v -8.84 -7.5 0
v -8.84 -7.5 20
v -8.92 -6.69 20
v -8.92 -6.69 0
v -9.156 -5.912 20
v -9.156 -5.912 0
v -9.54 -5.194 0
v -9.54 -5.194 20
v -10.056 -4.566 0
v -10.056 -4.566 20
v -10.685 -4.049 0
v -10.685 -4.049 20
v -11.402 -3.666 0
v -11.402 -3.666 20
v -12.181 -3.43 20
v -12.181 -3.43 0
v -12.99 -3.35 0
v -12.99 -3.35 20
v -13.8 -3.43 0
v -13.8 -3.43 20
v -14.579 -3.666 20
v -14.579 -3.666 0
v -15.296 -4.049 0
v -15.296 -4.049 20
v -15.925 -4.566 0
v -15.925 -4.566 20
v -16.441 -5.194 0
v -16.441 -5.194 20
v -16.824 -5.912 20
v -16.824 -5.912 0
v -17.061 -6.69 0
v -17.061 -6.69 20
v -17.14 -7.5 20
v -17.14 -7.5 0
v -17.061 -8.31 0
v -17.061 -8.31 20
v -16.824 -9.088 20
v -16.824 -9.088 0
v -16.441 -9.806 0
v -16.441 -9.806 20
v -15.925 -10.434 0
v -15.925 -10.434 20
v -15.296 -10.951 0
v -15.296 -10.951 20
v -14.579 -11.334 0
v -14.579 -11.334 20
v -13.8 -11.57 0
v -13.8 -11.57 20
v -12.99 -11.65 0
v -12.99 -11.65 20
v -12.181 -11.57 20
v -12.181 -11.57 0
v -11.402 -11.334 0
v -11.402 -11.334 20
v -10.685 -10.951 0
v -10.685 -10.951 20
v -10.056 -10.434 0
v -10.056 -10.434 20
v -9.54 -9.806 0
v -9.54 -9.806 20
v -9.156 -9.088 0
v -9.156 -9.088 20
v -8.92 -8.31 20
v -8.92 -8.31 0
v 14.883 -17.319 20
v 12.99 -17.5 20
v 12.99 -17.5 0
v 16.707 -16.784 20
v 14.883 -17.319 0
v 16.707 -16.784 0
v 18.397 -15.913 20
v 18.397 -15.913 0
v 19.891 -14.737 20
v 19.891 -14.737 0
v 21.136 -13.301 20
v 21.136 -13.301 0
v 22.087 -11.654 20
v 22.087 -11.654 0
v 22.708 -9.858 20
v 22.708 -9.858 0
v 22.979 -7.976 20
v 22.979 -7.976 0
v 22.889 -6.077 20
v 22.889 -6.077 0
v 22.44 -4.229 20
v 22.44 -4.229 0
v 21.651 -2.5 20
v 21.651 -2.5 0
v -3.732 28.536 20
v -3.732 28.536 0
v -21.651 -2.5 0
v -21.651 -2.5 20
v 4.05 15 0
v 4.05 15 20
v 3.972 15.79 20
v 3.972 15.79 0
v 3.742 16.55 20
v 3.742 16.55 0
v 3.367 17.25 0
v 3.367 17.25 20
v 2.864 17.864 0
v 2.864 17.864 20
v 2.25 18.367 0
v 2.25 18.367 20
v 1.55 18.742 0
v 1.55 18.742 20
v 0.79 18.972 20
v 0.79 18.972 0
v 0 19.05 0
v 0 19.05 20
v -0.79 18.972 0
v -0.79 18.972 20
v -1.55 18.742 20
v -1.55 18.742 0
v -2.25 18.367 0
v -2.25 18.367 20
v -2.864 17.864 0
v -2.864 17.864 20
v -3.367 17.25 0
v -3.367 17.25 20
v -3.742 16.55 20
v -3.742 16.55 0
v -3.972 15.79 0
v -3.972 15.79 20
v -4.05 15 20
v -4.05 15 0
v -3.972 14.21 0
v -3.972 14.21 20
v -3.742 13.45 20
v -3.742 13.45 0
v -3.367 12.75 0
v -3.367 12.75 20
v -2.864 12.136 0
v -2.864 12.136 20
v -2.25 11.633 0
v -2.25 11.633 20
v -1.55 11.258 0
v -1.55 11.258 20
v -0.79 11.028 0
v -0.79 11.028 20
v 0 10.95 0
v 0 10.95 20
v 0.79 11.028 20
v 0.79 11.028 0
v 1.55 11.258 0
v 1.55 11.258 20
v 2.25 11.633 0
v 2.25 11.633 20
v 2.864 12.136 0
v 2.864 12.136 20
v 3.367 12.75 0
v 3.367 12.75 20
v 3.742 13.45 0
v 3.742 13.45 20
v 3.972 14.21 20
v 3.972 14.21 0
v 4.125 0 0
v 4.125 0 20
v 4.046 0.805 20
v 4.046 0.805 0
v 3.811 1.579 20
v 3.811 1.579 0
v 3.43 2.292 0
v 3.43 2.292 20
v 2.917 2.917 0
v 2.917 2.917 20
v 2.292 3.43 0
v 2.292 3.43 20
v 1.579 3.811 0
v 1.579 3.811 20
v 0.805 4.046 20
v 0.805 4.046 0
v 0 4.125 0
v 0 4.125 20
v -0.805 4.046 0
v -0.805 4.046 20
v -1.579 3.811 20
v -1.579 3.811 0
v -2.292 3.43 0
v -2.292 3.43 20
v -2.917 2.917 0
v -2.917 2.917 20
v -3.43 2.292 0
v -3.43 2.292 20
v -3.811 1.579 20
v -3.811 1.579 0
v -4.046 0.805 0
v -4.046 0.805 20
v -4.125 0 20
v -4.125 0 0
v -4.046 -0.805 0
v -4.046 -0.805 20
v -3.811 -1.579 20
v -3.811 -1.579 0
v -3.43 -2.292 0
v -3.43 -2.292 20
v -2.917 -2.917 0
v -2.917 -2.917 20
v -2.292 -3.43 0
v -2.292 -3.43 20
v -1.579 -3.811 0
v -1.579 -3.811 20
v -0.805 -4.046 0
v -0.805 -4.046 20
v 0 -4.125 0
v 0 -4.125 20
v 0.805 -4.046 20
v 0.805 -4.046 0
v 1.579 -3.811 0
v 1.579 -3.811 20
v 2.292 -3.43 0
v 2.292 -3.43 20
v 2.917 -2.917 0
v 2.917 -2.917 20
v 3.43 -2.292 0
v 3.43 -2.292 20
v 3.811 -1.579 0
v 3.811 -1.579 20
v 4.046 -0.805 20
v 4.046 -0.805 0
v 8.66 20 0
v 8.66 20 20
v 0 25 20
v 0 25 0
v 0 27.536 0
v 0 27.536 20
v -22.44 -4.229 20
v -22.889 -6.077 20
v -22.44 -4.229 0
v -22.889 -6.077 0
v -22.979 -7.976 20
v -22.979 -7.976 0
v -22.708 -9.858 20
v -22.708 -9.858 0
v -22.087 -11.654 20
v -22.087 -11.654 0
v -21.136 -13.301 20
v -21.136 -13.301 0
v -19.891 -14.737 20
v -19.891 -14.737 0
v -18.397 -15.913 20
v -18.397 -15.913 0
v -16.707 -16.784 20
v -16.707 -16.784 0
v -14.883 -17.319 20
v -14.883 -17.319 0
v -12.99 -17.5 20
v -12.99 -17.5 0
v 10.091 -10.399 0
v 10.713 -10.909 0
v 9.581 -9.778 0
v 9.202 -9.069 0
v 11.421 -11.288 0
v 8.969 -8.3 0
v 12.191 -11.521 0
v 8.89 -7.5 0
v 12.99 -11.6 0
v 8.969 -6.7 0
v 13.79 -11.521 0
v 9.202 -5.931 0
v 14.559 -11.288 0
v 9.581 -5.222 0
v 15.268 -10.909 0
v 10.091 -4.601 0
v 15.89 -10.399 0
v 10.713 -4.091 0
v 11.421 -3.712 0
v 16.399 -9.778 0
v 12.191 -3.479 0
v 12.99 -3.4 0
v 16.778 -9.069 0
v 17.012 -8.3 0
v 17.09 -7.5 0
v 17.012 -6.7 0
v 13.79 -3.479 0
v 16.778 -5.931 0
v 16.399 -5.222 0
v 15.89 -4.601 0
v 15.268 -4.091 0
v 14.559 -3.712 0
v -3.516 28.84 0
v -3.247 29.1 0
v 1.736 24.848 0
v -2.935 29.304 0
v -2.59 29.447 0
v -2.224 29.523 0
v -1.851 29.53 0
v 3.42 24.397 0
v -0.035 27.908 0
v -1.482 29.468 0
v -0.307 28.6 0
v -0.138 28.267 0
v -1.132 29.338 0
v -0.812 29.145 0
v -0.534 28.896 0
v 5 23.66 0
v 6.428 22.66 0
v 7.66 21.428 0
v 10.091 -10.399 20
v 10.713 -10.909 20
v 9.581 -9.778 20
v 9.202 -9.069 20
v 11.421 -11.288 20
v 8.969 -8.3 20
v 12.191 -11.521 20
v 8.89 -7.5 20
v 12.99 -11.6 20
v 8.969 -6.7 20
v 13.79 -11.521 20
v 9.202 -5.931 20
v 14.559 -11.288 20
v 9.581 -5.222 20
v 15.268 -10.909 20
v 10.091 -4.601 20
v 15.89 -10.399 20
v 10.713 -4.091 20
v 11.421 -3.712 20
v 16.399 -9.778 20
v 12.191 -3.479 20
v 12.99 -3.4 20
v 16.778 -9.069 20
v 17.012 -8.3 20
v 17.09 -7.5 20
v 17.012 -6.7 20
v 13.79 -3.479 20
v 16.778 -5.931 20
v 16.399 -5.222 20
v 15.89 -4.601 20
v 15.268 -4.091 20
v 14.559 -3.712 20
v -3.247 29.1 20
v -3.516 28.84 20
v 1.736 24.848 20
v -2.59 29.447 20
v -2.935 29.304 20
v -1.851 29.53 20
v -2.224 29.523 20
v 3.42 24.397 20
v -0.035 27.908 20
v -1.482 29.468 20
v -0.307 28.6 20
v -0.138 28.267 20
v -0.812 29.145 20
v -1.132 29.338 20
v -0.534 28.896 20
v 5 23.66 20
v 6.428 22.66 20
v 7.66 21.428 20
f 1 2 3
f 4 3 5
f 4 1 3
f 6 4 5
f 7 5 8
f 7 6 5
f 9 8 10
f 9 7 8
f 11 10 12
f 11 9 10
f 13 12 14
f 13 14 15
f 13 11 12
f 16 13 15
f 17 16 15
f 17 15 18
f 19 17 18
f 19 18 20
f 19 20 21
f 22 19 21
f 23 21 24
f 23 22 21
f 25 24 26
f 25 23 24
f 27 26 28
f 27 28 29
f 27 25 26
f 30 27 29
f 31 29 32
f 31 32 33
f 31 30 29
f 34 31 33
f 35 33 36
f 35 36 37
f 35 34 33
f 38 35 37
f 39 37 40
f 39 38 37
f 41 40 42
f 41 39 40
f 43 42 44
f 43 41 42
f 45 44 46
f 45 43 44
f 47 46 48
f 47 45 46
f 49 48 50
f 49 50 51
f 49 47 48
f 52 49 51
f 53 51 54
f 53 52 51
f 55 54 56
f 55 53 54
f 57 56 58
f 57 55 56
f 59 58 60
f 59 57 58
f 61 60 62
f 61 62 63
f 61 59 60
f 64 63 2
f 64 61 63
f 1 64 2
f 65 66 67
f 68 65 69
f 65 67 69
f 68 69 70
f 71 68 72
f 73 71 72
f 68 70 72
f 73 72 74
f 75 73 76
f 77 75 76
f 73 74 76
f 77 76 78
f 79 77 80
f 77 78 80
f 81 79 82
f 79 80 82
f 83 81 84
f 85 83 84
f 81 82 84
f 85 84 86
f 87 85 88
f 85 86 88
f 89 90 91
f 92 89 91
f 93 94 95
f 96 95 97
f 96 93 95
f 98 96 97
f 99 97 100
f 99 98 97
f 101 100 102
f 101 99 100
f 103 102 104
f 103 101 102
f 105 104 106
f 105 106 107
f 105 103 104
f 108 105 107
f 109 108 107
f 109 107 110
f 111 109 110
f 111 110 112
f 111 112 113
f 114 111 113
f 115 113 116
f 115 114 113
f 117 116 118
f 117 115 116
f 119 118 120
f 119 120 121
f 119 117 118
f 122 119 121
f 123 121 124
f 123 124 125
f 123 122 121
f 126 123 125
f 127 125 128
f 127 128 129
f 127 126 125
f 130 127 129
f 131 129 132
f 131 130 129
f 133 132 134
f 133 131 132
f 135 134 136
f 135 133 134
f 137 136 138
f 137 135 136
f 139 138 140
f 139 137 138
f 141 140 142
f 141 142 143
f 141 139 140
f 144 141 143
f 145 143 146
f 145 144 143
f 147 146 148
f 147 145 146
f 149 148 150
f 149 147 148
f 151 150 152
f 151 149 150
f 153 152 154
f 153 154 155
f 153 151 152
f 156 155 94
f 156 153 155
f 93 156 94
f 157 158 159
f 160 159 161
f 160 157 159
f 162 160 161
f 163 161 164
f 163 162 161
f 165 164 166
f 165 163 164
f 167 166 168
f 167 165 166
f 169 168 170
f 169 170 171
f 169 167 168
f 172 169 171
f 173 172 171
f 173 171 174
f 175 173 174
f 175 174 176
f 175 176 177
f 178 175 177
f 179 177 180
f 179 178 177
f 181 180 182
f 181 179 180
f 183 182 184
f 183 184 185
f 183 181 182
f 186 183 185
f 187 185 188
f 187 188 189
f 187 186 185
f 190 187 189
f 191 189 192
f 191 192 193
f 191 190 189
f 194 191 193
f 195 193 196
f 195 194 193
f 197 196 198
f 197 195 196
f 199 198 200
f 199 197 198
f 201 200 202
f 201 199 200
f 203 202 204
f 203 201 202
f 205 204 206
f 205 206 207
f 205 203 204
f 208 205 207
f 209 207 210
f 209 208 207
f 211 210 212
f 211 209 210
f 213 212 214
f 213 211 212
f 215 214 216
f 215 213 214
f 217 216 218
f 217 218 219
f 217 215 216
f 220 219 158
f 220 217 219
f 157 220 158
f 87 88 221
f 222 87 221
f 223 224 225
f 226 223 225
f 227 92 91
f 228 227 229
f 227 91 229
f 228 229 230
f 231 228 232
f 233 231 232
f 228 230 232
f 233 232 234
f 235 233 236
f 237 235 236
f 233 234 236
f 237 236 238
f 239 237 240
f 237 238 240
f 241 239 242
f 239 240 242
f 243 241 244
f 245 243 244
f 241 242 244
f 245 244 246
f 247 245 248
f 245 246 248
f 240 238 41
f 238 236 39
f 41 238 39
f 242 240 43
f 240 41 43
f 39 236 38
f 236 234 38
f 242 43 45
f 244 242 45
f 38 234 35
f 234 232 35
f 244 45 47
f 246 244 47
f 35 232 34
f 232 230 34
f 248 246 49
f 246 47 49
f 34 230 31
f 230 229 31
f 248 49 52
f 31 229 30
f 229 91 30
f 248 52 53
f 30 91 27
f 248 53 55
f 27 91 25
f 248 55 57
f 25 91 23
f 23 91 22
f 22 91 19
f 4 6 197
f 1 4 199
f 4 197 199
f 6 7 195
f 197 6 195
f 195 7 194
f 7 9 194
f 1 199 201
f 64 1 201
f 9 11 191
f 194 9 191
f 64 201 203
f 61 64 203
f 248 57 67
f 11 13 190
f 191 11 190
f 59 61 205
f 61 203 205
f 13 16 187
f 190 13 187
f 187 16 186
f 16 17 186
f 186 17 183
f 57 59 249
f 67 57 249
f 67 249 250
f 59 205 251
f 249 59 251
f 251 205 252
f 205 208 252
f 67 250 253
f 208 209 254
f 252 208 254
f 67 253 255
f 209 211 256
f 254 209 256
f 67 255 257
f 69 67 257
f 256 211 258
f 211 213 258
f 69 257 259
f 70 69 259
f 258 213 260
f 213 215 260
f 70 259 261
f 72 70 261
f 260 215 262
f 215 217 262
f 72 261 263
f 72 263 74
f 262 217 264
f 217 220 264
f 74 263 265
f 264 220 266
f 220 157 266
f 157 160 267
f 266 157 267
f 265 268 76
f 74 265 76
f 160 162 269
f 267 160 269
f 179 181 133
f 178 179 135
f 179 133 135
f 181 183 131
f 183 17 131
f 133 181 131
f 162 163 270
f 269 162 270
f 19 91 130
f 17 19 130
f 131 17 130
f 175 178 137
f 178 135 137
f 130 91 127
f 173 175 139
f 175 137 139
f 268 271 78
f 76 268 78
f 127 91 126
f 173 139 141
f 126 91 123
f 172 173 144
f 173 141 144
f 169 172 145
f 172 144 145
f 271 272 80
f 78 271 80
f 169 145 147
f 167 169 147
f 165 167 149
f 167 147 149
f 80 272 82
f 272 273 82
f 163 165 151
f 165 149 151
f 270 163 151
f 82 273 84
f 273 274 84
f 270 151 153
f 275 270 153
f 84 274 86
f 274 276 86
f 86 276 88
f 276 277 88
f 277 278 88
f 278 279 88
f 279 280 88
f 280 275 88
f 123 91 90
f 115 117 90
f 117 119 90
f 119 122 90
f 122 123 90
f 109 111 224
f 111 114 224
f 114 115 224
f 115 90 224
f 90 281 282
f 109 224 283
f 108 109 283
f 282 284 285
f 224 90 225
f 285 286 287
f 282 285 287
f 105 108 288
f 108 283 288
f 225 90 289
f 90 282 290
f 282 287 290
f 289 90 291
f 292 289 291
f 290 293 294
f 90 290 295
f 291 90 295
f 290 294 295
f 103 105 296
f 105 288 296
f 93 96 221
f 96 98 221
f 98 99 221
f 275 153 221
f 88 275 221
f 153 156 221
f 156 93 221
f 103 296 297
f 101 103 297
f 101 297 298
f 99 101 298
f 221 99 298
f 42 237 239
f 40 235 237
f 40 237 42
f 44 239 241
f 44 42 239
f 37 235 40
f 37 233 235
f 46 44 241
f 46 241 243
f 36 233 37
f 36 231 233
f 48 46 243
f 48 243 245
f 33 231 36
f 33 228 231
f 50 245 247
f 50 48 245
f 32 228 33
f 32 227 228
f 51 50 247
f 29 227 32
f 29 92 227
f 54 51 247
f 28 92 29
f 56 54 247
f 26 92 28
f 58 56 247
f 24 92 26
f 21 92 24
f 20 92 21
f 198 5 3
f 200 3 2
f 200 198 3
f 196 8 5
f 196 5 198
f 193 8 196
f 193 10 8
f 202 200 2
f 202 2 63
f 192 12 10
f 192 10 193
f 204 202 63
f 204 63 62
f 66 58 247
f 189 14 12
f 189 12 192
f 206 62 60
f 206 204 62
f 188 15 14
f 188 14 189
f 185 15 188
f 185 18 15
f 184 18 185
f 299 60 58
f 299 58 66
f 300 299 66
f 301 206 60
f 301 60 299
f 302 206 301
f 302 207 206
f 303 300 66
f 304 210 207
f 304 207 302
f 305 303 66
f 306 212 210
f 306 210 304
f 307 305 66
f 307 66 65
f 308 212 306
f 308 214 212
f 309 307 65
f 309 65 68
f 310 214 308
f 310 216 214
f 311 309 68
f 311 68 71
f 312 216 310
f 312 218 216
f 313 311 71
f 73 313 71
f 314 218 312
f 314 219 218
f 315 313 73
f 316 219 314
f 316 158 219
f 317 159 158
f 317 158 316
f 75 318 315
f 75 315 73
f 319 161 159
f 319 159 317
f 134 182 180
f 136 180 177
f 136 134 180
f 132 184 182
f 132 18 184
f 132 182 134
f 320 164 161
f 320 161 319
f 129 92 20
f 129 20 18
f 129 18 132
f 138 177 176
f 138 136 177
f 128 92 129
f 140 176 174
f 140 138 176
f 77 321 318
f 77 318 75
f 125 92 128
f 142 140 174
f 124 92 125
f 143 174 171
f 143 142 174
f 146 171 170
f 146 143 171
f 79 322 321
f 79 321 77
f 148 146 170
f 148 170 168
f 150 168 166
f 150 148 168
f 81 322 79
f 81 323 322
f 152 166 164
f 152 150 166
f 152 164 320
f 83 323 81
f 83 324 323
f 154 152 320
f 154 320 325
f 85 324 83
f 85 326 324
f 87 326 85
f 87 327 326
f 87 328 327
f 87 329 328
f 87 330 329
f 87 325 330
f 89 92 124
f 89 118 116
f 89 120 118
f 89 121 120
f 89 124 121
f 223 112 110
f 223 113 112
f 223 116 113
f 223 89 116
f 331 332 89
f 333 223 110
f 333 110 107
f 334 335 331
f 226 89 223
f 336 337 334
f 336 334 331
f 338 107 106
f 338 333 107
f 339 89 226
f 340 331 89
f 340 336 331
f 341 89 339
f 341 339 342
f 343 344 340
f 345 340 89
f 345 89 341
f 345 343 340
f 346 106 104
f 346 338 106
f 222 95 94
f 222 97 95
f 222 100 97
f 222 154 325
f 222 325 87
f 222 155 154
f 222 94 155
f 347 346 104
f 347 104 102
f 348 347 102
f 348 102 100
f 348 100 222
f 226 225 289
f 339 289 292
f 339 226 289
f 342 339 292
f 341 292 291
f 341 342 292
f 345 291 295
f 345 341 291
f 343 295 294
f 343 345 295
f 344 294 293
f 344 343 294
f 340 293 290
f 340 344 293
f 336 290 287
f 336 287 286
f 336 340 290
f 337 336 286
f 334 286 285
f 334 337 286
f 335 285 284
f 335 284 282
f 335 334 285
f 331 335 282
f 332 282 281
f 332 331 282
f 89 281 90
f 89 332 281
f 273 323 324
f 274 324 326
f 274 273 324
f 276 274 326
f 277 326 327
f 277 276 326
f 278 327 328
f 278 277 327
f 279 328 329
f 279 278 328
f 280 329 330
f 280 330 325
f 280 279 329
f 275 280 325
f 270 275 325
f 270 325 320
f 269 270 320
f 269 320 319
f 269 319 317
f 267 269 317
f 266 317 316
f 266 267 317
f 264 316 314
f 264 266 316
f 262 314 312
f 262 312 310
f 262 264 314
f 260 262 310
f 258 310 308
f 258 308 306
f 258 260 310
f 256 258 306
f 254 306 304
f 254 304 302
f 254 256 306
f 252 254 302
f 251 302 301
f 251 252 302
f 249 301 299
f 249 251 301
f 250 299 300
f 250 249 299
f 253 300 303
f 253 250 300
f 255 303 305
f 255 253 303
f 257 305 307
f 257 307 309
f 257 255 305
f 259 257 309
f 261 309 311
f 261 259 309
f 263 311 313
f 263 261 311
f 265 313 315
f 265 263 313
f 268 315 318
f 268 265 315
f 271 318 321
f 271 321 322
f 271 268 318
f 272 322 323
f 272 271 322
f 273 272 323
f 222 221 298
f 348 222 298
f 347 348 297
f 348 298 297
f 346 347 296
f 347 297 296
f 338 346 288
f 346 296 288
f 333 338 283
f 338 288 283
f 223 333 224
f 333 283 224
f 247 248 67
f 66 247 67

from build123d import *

# Parameters (mm, degrees)
F0_R     = 4.15
F0_R_2   = 4.1
F0_R_3   = 4.125
F0_R_4   = 4.05
F1_DEPTH = 20
F2_R     = 2


with BuildPart() as f1:
    # F0 (on Top) → F1 (new body)
    with BuildSketch(Plane.XY):
        with BuildLine():
            ThreePointArc((0, 25), (-5, 23.660254), (-8.660254, 20))
            Line((-8.660254, 20), (-21.650635, -2.5))
            ThreePointArc((-21.650635, -2.5), (-21.650635, -12.5), (-12.990381, -17.5))
            Line((-12.990381, -17.5), (12.990381, -17.5))
            ThreePointArc((12.990381, -17.5), (21.650635, -12.5), (21.650635, -2.5))
            Line((21.650635, -2.5), (8.660254, 20))
            ThreePointArc((8.660254, 20), (5, 23.660254), (0, 25))
        make_face()
        with Locations((-12.990381, -7.5)):
            Circle(F0_R, mode=Mode.SUBTRACT)
        with Locations((12.990381, -7.5)):
            Circle(F0_R_2, mode=Mode.SUBTRACT)
        Circle(F0_R_3, mode=Mode.SUBTRACT)
        with Locations((0, 15)):
            Circle(F0_R_4, mode=Mode.SUBTRACT)
        with BuildLine():
            Line((0, 35), (-8.660254, 20))
            ThreePointArc((-8.660254, 20), (-5, 23.660254), (0, 25))
            Line((0, 25), (0, 35))
        make_face()
    extrude(amount=F1_DEPTH)

    # F2
    f2_edges = [f1.edges().sort_by_distance(p)[0] for p in [
        (0, 35, 10),
    ]]
    fillet(f2_edges, radius=F2_R)


solid = f1.part
